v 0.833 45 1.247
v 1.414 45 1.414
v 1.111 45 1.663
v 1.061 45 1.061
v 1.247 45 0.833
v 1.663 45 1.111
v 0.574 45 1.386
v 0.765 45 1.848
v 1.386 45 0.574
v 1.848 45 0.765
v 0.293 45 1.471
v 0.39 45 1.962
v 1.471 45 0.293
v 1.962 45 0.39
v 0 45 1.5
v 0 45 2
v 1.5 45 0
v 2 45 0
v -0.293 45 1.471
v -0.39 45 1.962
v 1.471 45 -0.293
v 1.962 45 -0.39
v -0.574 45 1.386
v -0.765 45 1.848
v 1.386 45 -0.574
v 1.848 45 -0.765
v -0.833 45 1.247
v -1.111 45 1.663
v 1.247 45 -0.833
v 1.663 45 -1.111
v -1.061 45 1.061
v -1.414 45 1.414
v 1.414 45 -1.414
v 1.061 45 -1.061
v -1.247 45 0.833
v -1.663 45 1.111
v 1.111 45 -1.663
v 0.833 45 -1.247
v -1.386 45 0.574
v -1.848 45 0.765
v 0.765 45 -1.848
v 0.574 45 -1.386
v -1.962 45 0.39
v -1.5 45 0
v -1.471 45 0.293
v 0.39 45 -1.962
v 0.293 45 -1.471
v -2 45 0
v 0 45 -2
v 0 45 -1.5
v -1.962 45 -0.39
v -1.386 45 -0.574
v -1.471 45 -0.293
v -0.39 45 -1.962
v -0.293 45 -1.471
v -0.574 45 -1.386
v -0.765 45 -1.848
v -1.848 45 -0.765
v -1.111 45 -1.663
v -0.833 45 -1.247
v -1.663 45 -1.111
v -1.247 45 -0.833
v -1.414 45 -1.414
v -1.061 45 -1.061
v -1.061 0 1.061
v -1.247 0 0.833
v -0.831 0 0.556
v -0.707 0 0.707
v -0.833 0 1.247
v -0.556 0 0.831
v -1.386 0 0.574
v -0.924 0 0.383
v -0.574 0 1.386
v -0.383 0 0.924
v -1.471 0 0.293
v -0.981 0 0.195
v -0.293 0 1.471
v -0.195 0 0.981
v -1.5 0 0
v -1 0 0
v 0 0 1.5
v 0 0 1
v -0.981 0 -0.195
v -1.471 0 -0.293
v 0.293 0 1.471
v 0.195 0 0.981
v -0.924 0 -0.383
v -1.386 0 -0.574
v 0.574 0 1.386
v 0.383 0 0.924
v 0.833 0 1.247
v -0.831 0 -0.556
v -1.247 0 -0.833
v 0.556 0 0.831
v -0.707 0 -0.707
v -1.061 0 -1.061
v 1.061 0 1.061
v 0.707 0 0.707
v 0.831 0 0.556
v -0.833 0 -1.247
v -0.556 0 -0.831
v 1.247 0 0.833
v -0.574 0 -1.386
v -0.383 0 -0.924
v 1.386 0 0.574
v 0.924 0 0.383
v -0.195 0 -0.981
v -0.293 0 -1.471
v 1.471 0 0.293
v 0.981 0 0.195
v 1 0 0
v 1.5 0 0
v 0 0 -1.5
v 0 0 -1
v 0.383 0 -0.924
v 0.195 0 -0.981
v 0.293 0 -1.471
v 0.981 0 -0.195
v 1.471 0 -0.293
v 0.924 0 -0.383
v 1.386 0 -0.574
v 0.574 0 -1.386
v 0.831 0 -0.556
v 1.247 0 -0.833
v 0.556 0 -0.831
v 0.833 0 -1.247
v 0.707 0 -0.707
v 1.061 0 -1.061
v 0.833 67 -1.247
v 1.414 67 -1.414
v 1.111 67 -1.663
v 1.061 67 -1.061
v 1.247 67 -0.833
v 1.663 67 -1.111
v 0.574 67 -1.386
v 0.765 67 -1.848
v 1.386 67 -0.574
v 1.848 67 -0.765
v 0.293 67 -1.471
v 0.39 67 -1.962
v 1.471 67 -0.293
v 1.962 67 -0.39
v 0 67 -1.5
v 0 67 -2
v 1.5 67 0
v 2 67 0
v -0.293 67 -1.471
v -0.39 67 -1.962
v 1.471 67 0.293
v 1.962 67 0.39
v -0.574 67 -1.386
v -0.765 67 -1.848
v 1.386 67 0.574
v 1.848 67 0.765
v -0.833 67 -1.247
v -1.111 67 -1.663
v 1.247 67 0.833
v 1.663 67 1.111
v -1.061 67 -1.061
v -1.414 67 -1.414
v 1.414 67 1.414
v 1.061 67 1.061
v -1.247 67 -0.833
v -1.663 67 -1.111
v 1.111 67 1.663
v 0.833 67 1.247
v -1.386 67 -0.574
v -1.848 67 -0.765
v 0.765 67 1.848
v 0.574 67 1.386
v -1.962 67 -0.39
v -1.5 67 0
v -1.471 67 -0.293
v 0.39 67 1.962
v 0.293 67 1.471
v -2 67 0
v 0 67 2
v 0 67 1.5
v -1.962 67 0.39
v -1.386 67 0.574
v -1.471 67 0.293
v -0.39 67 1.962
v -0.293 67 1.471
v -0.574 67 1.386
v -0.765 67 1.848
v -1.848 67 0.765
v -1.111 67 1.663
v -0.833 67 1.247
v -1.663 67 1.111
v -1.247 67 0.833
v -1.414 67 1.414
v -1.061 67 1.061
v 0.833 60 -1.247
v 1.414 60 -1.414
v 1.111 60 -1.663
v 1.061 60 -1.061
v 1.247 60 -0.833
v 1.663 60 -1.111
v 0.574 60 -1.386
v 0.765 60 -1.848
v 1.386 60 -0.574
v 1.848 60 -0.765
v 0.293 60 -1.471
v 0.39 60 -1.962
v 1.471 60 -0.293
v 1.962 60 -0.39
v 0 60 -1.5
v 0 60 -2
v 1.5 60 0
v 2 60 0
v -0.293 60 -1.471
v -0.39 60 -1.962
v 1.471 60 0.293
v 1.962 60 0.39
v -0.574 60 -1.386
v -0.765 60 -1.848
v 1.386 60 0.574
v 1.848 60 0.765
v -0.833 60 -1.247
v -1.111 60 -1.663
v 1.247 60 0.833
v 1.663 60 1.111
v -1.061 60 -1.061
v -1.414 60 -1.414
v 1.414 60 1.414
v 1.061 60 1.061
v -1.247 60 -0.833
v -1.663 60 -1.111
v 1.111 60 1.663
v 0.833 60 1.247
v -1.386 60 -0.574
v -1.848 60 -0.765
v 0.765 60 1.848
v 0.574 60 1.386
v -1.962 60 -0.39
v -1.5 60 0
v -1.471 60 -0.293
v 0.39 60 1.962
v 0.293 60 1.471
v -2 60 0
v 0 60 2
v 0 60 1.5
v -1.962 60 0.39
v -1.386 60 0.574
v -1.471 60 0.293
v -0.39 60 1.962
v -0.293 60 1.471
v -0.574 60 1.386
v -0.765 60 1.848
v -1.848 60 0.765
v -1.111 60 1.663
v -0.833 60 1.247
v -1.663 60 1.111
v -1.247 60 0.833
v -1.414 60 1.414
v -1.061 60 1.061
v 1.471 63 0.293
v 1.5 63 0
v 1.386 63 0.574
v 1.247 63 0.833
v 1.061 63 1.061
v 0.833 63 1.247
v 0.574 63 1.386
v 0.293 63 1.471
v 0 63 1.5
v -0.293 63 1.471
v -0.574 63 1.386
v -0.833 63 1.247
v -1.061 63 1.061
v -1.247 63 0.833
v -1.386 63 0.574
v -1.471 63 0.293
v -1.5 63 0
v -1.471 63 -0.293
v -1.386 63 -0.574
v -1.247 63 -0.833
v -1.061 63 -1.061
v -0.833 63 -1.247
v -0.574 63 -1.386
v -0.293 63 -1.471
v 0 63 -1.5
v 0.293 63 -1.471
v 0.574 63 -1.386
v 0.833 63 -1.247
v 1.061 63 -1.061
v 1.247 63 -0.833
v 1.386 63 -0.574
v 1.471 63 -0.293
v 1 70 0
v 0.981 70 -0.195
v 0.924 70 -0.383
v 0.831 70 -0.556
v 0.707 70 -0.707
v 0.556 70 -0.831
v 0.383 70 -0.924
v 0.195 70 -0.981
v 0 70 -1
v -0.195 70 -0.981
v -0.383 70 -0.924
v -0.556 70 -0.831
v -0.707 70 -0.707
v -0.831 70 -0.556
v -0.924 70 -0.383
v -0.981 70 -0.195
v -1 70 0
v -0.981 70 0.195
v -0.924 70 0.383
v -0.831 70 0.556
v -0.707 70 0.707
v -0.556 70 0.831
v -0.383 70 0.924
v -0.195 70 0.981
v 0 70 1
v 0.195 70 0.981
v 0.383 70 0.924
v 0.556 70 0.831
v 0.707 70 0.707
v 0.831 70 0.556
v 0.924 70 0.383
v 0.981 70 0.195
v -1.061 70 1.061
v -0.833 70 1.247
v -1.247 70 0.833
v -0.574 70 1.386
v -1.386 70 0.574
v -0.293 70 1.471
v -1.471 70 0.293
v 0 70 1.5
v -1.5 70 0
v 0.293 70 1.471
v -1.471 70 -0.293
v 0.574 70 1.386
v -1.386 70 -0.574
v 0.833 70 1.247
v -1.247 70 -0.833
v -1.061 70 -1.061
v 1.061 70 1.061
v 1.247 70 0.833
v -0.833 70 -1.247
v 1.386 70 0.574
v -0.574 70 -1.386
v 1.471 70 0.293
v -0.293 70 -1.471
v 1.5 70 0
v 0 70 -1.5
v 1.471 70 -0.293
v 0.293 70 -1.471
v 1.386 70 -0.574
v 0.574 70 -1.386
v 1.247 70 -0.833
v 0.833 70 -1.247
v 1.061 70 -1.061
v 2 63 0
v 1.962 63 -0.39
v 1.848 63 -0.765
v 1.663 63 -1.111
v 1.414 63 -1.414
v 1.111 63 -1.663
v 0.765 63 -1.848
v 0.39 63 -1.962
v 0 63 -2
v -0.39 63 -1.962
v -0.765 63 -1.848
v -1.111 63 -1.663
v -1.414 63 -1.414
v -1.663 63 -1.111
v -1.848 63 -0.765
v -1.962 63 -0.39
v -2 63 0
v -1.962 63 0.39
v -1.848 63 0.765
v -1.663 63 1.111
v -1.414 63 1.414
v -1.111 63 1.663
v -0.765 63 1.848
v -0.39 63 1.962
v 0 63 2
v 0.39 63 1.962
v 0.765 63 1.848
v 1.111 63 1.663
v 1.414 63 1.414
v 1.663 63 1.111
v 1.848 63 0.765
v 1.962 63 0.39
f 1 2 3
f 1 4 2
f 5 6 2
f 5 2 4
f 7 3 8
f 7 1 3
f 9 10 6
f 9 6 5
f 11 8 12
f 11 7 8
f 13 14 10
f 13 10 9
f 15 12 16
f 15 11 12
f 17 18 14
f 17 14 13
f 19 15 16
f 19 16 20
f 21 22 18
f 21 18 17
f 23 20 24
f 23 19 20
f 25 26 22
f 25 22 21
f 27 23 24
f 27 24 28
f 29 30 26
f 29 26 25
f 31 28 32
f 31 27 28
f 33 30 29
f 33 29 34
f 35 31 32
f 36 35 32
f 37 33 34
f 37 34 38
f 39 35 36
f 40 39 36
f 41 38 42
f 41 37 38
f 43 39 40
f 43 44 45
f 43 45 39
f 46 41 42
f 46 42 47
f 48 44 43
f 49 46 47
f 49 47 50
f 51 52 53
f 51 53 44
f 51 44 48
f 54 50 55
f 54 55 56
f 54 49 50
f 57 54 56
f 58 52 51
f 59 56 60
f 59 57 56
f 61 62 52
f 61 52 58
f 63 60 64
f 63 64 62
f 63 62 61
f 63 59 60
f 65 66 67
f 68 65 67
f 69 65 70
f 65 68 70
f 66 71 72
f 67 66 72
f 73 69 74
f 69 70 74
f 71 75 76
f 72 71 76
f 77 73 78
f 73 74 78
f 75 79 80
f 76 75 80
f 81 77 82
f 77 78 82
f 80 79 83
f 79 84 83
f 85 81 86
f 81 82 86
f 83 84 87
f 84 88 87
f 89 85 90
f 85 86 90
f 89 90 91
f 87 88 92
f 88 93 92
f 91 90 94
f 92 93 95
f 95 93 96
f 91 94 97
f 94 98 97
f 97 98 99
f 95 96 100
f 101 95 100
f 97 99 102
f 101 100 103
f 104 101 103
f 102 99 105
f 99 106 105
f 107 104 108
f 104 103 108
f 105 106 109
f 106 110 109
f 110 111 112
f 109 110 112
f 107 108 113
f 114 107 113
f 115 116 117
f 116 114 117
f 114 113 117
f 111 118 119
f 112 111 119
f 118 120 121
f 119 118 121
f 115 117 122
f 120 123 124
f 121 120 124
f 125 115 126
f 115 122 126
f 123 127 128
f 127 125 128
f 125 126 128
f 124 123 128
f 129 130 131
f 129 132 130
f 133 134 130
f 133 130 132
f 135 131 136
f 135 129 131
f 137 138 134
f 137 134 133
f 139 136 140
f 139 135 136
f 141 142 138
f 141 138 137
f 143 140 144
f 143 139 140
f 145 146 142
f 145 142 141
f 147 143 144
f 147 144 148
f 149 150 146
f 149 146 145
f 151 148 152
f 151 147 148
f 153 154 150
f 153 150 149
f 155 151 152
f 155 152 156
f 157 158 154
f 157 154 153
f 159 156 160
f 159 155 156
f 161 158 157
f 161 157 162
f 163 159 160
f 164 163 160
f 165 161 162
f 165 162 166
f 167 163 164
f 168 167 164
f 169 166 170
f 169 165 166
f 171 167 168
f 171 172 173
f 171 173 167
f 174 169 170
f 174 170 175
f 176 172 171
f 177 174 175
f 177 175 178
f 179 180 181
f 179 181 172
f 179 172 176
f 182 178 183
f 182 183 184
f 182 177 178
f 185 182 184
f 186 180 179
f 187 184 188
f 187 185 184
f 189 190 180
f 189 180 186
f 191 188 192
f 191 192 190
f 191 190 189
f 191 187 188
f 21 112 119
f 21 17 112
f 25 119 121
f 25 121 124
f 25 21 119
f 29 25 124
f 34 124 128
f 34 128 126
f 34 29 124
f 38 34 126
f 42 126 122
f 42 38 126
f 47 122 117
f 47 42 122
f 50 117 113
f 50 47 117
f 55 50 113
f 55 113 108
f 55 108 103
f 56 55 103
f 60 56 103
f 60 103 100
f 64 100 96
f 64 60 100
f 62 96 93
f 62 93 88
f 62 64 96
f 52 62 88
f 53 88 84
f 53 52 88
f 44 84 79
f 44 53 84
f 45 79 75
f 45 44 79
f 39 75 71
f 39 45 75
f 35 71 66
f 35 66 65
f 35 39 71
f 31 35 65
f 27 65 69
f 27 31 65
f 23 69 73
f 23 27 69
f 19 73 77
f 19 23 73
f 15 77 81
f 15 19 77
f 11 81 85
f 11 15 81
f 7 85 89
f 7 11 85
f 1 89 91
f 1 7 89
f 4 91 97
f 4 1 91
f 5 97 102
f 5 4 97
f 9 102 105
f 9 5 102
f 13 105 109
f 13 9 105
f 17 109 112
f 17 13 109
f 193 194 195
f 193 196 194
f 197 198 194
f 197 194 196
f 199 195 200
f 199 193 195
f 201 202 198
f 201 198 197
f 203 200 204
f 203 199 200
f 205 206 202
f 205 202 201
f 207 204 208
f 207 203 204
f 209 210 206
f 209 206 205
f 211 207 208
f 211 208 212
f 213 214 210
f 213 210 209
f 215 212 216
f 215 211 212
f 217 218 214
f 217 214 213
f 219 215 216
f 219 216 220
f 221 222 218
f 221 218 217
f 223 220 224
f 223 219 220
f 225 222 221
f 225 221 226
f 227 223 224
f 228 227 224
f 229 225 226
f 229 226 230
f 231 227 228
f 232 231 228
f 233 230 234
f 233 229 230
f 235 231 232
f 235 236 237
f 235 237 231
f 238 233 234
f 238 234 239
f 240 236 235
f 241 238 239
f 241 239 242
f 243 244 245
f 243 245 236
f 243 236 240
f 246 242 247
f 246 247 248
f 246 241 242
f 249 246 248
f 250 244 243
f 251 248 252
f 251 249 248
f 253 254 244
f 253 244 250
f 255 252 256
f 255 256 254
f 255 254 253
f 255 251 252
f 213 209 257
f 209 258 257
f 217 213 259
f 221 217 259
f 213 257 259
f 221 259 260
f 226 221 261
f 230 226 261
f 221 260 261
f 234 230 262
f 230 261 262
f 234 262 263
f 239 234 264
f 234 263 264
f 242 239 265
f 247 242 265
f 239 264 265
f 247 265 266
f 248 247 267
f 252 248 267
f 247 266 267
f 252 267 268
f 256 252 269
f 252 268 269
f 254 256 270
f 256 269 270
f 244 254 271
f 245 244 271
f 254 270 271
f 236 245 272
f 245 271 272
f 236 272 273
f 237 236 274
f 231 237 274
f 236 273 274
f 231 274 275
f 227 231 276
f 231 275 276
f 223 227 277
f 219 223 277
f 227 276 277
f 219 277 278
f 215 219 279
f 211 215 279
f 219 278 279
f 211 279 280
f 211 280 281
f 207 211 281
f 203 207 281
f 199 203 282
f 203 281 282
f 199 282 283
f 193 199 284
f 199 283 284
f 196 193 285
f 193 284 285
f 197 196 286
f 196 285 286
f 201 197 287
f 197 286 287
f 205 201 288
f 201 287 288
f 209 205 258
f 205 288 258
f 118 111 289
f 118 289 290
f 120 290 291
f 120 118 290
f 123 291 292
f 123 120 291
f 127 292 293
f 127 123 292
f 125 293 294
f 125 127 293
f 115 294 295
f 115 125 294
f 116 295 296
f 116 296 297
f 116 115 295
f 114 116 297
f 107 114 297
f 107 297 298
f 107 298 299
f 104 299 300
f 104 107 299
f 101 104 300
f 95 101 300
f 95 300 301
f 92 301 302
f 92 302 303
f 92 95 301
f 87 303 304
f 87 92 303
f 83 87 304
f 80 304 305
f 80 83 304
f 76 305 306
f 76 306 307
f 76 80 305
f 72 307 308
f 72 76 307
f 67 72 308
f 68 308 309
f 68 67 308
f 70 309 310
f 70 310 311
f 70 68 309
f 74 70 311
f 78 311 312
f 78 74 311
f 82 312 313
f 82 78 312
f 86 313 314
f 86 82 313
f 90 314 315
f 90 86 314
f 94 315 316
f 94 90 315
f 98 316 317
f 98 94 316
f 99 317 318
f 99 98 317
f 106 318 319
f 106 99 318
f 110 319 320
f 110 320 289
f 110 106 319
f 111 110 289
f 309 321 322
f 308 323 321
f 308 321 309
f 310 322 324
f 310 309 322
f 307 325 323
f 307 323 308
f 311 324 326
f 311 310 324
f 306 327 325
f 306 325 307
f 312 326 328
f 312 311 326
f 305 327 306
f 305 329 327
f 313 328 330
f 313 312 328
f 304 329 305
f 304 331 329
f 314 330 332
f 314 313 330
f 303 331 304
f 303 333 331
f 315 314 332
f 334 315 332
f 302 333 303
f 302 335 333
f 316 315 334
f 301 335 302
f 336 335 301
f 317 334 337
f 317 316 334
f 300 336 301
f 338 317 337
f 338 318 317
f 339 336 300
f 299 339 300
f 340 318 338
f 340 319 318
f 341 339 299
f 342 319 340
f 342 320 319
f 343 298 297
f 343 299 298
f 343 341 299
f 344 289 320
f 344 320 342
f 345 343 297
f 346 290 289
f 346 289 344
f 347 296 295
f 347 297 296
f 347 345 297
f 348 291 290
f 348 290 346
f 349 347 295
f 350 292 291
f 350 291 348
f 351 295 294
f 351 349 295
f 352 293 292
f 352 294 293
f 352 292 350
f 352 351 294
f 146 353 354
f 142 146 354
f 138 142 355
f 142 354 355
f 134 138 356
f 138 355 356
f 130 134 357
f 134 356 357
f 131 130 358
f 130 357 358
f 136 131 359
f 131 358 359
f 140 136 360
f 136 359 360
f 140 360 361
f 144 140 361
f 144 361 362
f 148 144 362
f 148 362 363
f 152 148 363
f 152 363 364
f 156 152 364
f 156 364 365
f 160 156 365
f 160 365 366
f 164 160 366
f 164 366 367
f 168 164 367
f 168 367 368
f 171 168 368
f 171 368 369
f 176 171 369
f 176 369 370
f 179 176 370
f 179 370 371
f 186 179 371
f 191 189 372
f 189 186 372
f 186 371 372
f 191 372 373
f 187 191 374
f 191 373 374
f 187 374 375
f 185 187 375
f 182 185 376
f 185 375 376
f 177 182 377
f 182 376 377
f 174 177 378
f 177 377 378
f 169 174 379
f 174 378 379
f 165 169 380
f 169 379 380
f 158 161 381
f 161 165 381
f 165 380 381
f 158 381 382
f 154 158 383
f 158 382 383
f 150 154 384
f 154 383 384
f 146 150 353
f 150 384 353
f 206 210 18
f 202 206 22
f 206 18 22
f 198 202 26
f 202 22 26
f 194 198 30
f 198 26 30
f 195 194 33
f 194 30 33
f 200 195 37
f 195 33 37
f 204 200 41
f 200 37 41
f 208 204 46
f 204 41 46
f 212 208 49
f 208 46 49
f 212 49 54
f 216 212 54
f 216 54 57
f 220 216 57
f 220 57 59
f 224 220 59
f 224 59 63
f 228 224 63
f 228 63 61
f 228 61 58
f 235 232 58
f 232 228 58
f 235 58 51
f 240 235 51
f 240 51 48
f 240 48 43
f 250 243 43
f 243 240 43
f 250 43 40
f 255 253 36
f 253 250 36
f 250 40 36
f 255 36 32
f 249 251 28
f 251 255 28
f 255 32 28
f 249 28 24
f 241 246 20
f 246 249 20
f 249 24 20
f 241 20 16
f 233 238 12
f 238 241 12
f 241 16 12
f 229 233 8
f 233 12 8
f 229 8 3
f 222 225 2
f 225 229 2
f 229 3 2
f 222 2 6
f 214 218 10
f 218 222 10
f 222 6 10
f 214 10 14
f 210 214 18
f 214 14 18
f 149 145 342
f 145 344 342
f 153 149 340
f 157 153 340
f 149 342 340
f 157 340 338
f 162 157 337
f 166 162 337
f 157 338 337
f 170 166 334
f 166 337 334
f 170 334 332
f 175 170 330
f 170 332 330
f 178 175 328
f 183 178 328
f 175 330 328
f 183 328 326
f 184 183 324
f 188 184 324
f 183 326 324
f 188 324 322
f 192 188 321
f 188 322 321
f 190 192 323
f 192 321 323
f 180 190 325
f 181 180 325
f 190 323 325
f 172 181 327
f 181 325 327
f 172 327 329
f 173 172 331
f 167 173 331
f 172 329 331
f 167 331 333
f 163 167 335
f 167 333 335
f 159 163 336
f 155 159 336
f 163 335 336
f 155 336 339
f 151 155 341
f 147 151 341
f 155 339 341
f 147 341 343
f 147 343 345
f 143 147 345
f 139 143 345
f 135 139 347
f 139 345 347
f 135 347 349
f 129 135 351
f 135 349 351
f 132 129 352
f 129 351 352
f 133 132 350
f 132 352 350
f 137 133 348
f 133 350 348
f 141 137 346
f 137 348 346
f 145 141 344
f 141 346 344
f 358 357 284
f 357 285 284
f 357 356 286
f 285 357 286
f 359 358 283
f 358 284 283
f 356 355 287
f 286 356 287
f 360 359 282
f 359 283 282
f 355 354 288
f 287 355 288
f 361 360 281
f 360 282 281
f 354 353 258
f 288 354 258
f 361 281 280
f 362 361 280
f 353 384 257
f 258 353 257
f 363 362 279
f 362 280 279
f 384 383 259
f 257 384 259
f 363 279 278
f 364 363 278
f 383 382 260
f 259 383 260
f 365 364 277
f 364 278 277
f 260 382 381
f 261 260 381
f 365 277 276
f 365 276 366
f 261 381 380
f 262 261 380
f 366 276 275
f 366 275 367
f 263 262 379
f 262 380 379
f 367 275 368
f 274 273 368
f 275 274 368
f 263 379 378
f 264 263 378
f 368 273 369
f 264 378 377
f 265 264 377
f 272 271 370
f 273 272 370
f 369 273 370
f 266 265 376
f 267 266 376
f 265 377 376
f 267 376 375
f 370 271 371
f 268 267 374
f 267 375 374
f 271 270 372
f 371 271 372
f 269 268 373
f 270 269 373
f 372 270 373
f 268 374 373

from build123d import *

# Parameters (mm, degrees)
SKETCH_1_R      = 2
SKETCH_1_R_2    = 1
EXTRUDE_1_DEPTH = 70
SKETCH_2_W      = 0.5
SKETCH_2_H      = 3
SKETCH_3_W      = 0.5
SKETCH_3_H      = 45


with BuildPart() as part:
    # Эскиз1 → Бобышка-Вытянуть1 (new body)
    with BuildSketch(Plane(origin=(0, 0, 0), x_dir=(1, 0, 0), z_dir=(0, 1, 0))):
        Circle(SKETCH_1_R)
        Circle(SKETCH_1_R_2, mode=Mode.SUBTRACT)
    extrude(amount=EXTRUDE_1_DEPTH)

    # Эскиз2 → Вырез-Повернуть1 (revolve, cut)
    with BuildSketch(Plane.XY):
        with Locations((1.75, 68.5)):
            Rectangle(SKETCH_2_W, SKETCH_2_H)
        with Locations((1.75, 61.5)):
            Rectangle(SKETCH_2_W, SKETCH_2_H)
    revolve(axis=Axis((0, 70, 0), (0, -1, 0)), mode=Mode.SUBTRACT)

    # Эскиз3 → Вырез-Повернуть2 (revolve, cut)
    with BuildSketch(Plane.XY):
        with Locations((1.75, 22.5)):
            Rectangle(SKETCH_3_W, SKETCH_3_H)
    revolve(axis=Axis((0, 0, 0), (0, 1, 0)), mode=Mode.SUBTRACT)


solid = part.part
